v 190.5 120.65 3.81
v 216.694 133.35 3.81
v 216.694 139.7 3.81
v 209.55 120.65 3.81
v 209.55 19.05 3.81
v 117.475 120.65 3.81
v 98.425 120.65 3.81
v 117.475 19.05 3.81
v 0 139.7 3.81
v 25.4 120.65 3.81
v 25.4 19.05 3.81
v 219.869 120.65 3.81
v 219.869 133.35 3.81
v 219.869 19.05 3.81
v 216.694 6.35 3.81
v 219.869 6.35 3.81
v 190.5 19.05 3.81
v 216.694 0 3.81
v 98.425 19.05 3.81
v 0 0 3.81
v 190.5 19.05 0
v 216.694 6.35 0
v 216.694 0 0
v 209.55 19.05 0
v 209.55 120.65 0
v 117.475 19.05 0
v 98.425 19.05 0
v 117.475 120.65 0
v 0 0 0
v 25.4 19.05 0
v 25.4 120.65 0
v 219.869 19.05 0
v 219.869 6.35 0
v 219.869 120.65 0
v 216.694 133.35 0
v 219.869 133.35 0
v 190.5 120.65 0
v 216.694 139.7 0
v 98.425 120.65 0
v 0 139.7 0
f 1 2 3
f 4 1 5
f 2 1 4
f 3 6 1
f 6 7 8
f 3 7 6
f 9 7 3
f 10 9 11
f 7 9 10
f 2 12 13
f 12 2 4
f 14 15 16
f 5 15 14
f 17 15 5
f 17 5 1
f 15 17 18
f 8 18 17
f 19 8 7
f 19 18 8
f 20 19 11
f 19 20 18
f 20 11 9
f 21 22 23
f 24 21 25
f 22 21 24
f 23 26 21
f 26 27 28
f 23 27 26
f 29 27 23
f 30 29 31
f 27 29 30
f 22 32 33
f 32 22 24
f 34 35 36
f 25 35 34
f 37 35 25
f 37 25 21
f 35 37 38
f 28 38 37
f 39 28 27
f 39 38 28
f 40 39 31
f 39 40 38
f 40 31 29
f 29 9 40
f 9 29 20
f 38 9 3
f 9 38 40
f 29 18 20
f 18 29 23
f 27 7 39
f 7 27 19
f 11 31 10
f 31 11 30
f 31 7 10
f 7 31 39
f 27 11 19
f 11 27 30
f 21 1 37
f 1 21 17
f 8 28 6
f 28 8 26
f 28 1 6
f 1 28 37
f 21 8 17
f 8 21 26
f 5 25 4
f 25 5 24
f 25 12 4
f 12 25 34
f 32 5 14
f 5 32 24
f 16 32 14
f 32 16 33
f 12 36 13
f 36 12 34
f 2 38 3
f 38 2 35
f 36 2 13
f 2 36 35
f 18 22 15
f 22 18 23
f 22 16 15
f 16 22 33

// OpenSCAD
// Adoorn Mailbox Number Positioning Frame (Split for Bambu P1S)
// Raised Border Version – 2-piece print for smaller bed
// Flat-printable notches for alignment (top + bottom)
// Export partA() and partB() separately to STL

inch = 25.4;  // convert inches to mm

// Dimensions
num_height = 4 * inch;
num_width = 2.875 * inch;
spacing = 0.75 * inch;
rear_offset = 17.3125 * inch;
bottom_offset = 0.75 * inch;
// make the top and bottom the same size
top_offset = bottom_offset;

frame_thickness = 0.15 * inch;
frame_height = bottom_offset + num_height + top_offset;
frame_length = rear_offset;

split_pos = frame_length / 2;  // divide into two equal parts

// Notch specs
notch_width = 0.25 * inch;     // horizontal thickness of notch
notch_depth = 0.125 * inch;    // how far it overlaps
notch_height = 0.25 * inch;    // vertical size of notch

//---------------------------------------------
// --- Base Frame Shape (with cutouts) ---
//---------------------------------------------
module full_frame() {
    difference() {
        cube([frame_length, frame_height, frame_thickness]);
        
        // Number cutouts
        translate([1.0 * inch, bottom_offset, 0])
            cube([num_width, num_height, frame_thickness + 1]);
        translate([1.0 * inch + num_width + spacing, bottom_offset, 0])
            cube([num_width, num_height, frame_thickness + 1]);
        translate([1.0 * inch + (num_width + spacing) * 2, bottom_offset, 0])
            cube([num_width, num_height, frame_thickness + 1]);
        translate([1.0 * inch + (num_width + spacing) * 3, bottom_offset, 0])
            cube([num_width, num_height, frame_thickness + 1]);
    }

    // Rear alignment tab
    translate([0, 0, 0])
        cube([1.0 * inch, frame_height, frame_thickness]);

    // Bottom flange
    translate([0, 0, -0.75 * inch])
        cube([frame_length, 0.75 * inch, frame_thickness]);
}

//---------------------------------------------
// --- Part A (rear half with female notches) ---
//---------------------------------------------
module partA() {
    difference() {
        intersection() {
            full_frame();
            cube([split_pos, frame_height, frame_thickness + 1]);
        }

        // Top notch (female)
        translate([split_pos - notch_depth, frame_height - notch_height, 0])
            cube([notch_depth, notch_height, frame_thickness + 1]);

        // Bottom notch (female)
        translate([split_pos - notch_depth, 0, 0])
            cube([notch_depth, notch_height, frame_thickness + 1]);
    }
}

//---------------------------------------------
// --- Part B (front half with male bumps) ---
//---------------------------------------------
module partB() {
    union() {
        // Base section (front half)
        intersection() {
            full_frame();
            translate([split_pos, 0, 0])
                cube([frame_length, frame_height, frame_thickness + 1]);
        }

        // Top notch bump (male)
        translate([split_pos - notch_depth, frame_height - notch_height, 0])
            cube([notch_depth, notch_height, frame_thickness]);

        // Bottom notch bump (male)
        translate([split_pos - notch_depth, 0, 0])
            cube([notch_depth, notch_height, frame_thickness]);
    }
}

//---------------------------------------------
// Uncomment to export one at a time
//---------------------------------------------
partA();
//partB();
